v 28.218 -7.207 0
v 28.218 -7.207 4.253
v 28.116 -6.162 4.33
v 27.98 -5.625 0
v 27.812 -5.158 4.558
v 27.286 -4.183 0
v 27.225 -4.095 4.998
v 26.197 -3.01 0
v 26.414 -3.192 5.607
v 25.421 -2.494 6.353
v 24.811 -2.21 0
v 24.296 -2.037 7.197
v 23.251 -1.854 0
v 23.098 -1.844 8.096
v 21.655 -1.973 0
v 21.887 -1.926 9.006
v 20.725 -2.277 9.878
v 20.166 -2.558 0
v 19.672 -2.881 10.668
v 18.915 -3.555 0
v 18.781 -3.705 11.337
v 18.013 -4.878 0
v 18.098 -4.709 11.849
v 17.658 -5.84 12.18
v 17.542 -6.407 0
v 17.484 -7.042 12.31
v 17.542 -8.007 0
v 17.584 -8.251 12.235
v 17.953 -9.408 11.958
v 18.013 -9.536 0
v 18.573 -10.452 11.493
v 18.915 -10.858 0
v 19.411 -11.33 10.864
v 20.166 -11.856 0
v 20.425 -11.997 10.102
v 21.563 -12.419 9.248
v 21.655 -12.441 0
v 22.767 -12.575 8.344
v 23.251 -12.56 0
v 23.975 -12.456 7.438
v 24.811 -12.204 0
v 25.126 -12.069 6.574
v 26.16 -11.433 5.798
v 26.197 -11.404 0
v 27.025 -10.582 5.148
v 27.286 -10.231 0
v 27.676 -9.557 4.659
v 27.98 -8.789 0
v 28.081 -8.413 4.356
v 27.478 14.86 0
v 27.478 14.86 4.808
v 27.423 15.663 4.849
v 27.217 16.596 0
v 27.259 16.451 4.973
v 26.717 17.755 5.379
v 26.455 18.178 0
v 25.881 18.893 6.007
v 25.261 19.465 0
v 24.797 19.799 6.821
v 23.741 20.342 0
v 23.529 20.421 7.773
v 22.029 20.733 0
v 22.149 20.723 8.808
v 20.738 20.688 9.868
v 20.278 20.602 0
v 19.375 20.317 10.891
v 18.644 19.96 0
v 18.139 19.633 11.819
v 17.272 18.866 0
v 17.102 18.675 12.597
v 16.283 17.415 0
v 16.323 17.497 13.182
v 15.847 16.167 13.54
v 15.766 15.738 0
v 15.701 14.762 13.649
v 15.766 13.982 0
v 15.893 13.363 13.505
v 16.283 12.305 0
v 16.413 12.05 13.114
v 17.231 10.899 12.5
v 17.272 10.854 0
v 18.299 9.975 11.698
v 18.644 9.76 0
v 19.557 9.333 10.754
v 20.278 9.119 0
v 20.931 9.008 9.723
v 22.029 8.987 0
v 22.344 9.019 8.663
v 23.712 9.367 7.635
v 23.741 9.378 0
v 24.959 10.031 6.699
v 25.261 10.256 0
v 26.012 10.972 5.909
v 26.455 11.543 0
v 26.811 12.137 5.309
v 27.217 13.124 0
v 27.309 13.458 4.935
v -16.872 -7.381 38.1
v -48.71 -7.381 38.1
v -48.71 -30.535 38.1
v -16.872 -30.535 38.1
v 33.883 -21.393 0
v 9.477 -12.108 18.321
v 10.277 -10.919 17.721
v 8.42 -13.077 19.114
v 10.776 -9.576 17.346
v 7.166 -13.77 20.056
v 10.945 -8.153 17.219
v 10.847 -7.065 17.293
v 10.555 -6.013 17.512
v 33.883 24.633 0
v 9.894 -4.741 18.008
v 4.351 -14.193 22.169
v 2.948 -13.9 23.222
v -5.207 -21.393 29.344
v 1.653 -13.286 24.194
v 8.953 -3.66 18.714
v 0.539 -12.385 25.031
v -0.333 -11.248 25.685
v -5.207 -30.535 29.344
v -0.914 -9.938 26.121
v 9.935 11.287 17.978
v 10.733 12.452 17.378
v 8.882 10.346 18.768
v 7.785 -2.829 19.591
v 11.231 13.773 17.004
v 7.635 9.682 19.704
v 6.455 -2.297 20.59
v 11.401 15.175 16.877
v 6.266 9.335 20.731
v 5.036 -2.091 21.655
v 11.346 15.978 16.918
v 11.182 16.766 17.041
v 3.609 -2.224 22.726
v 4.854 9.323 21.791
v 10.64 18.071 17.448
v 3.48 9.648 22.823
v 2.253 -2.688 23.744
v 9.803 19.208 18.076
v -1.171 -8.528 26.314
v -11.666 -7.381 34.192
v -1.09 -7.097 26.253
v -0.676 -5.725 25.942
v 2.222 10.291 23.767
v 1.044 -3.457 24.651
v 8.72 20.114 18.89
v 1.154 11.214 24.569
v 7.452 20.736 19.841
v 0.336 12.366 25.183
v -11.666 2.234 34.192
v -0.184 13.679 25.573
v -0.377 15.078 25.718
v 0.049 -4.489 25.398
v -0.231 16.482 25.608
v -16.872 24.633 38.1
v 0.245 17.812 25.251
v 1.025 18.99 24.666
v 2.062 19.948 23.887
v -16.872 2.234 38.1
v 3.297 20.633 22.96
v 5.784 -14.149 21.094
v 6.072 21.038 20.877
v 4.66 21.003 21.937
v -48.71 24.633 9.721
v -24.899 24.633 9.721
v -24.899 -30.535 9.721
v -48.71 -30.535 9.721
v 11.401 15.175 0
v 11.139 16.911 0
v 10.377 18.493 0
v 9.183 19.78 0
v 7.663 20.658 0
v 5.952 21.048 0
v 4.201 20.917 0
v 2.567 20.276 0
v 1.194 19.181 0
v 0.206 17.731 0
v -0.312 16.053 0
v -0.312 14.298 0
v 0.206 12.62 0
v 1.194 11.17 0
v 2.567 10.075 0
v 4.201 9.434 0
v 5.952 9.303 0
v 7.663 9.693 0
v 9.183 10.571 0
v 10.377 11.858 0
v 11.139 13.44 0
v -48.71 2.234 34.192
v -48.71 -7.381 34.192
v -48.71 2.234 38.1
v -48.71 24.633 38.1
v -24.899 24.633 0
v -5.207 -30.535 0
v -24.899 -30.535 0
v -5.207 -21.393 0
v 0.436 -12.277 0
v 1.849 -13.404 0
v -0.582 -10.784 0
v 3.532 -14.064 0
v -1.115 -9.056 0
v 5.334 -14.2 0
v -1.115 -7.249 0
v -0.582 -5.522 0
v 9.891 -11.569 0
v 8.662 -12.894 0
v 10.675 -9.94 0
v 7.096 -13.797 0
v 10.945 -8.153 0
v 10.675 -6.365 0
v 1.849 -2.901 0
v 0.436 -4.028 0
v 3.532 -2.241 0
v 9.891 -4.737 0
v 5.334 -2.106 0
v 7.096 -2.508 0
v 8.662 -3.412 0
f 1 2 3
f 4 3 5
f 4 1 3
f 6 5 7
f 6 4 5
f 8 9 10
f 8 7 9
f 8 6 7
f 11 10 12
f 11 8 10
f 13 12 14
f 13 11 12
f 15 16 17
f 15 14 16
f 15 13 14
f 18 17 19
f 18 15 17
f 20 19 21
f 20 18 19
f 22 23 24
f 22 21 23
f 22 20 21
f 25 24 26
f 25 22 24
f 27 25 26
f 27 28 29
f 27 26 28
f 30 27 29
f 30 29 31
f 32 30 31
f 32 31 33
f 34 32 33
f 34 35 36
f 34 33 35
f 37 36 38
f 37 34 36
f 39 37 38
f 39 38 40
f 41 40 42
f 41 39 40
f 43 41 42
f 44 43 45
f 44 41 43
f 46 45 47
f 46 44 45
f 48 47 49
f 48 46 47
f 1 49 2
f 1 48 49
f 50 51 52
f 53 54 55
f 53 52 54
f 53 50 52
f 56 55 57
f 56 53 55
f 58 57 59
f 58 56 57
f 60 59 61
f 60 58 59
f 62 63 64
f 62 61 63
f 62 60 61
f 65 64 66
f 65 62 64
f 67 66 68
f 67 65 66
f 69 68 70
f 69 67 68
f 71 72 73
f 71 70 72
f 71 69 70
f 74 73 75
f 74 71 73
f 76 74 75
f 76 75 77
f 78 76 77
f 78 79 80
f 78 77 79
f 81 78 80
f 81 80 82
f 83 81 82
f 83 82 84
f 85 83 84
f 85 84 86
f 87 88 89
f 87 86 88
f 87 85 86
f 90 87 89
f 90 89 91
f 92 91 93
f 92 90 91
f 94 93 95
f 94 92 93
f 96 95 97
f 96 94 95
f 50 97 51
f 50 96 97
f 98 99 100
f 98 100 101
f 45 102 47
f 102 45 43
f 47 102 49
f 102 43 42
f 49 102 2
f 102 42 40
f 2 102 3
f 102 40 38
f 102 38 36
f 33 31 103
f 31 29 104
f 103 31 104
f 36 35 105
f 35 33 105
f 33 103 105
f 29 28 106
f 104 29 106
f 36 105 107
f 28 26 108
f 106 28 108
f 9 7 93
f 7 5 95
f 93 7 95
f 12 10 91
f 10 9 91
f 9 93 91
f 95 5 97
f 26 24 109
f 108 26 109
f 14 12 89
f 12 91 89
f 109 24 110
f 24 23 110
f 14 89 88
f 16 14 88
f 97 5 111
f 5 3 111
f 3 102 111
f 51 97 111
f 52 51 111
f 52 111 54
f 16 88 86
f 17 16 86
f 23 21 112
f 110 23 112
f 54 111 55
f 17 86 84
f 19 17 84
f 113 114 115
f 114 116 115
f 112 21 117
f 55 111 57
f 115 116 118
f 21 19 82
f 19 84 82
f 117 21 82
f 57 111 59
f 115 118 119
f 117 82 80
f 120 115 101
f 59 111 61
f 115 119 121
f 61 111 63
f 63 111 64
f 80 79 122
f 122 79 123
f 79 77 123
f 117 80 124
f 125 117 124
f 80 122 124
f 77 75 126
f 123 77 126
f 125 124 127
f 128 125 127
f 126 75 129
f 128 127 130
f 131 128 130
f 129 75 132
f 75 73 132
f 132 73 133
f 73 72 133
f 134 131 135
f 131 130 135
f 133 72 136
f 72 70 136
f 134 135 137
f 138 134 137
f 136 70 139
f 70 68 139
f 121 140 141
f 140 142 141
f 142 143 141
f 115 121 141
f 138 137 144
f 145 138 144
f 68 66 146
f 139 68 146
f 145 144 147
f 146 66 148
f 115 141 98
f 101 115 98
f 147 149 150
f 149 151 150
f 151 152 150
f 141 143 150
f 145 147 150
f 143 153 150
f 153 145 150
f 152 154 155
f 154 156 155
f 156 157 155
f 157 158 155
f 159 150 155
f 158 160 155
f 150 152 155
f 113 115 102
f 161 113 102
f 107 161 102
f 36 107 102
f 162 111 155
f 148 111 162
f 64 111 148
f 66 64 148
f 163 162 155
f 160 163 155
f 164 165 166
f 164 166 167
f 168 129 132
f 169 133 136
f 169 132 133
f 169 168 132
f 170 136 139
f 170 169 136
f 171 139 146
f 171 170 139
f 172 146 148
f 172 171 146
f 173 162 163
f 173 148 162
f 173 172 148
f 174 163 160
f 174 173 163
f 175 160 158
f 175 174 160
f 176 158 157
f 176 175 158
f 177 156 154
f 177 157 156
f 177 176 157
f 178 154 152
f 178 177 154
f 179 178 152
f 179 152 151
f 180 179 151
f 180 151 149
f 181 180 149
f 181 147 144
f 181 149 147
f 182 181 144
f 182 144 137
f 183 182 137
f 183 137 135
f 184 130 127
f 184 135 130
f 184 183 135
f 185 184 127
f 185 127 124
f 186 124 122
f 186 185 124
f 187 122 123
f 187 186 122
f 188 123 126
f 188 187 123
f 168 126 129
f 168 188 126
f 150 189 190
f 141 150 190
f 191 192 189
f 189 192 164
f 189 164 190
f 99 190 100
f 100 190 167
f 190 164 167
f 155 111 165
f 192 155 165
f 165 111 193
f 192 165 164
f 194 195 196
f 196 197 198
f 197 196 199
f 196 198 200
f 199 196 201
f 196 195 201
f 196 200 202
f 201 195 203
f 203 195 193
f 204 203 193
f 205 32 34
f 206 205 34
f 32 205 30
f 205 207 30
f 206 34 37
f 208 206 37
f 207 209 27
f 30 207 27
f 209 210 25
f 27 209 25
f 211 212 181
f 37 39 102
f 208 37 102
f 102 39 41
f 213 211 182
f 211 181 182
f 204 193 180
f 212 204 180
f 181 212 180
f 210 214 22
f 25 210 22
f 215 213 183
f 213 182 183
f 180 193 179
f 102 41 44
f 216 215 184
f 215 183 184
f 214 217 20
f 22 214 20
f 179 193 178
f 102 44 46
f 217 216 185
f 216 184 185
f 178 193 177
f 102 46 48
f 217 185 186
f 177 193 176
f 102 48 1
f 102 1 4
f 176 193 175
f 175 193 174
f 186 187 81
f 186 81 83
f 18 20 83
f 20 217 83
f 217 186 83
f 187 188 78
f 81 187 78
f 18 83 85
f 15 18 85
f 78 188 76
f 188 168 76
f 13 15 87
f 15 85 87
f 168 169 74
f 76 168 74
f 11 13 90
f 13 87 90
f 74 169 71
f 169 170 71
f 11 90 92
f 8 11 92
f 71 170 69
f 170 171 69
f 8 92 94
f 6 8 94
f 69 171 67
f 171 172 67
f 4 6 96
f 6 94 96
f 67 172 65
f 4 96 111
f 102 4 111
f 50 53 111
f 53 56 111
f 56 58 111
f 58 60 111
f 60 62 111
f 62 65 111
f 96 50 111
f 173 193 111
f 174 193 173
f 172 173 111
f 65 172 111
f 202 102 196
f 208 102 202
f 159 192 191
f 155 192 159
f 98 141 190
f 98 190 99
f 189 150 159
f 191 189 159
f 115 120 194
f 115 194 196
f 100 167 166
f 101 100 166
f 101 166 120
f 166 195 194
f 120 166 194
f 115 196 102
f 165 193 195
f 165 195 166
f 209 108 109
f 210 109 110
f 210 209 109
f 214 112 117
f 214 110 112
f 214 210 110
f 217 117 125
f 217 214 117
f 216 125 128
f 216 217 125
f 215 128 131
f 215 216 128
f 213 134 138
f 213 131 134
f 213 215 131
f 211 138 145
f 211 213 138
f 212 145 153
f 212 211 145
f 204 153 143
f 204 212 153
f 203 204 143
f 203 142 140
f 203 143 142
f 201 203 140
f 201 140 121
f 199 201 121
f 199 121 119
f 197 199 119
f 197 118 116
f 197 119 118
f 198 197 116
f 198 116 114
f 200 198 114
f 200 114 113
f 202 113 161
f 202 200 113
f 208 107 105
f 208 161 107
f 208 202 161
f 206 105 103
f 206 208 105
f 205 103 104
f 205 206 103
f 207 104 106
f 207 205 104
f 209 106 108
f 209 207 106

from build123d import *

# Parameters (mm, degrees)
F0_R     = 6.0638349588
F0_R_2   = 5.3684107219
F0_R_3   = 5.8892395432
F1_DEPTH = 38.1
F2_W     = 23.8111317158
F2_H     = 9.7214011475
F3_DEPTH = 55.1676675677
F4_W     = 9.6149358433
F4_H     = 3.907698667
F5_DEPTH = 82.5948805938


with BuildPart() as f1:
    # F0 (on Top) → F1 (new body)
    with BuildSketch(Plane.XY):
        Polygon((33.8834859431, 24.6326997876), (-48.7103946507, 24.6326997876), (-48.7103946507, -30.5349677801), (-5.2067479119, -30.5349677801), (-5.2067479119, -21.3928986341), (33.8834859431, -21.3928986341), align=None)
        with Locations((4.881054163, -8.1526581198)):
            Circle(F0_R, mode=Mode.SUBTRACT)
        with Locations((22.8499509394, -7.206926588)):
            Circle(F0_R_2, mode=Mode.SUBTRACT)
        with Locations((5.5115413852, 15.1753844693)):
            Circle(F0_R_3, mode=Mode.SUBTRACT)
        with Locations((21.5889755636, 14.860141091)):
            Circle(F0_R_3, mode=Mode.SUBTRACT)
    extrude(amount=F1_DEPTH)

    # F2 (on face) → F3 (cut, through all)
    with BuildSketch(Plane(origin=(0, 24.6326997876, 0), x_dir=(-1, 0, 0), z_dir=(0, 1, 0))):
        Polygon((-33.8834859431, 0), (16.8716572225, 38.1), (-33.8834859431, 38.1), align=None)
        with Locations((36.8048287928, 4.8607005738)):
            Rectangle(F2_W, F2_H)
    extrude(amount=-F3_DEPTH, mode=Mode.SUBTRACT)

    # F4 (on face) → F5 (cut, through all)
    with BuildSketch(Plane(origin=(-48.7103946507, 0, 0), x_dir=(0, -1, 0), z_dir=(-1, 0, 0))):
        with Locations((2.5730371708, 36.1461506665)):
            Rectangle(F4_W, F4_H)
    extrude(amount=-F5_DEPTH, mode=Mode.SUBTRACT)


solid = f1.part
